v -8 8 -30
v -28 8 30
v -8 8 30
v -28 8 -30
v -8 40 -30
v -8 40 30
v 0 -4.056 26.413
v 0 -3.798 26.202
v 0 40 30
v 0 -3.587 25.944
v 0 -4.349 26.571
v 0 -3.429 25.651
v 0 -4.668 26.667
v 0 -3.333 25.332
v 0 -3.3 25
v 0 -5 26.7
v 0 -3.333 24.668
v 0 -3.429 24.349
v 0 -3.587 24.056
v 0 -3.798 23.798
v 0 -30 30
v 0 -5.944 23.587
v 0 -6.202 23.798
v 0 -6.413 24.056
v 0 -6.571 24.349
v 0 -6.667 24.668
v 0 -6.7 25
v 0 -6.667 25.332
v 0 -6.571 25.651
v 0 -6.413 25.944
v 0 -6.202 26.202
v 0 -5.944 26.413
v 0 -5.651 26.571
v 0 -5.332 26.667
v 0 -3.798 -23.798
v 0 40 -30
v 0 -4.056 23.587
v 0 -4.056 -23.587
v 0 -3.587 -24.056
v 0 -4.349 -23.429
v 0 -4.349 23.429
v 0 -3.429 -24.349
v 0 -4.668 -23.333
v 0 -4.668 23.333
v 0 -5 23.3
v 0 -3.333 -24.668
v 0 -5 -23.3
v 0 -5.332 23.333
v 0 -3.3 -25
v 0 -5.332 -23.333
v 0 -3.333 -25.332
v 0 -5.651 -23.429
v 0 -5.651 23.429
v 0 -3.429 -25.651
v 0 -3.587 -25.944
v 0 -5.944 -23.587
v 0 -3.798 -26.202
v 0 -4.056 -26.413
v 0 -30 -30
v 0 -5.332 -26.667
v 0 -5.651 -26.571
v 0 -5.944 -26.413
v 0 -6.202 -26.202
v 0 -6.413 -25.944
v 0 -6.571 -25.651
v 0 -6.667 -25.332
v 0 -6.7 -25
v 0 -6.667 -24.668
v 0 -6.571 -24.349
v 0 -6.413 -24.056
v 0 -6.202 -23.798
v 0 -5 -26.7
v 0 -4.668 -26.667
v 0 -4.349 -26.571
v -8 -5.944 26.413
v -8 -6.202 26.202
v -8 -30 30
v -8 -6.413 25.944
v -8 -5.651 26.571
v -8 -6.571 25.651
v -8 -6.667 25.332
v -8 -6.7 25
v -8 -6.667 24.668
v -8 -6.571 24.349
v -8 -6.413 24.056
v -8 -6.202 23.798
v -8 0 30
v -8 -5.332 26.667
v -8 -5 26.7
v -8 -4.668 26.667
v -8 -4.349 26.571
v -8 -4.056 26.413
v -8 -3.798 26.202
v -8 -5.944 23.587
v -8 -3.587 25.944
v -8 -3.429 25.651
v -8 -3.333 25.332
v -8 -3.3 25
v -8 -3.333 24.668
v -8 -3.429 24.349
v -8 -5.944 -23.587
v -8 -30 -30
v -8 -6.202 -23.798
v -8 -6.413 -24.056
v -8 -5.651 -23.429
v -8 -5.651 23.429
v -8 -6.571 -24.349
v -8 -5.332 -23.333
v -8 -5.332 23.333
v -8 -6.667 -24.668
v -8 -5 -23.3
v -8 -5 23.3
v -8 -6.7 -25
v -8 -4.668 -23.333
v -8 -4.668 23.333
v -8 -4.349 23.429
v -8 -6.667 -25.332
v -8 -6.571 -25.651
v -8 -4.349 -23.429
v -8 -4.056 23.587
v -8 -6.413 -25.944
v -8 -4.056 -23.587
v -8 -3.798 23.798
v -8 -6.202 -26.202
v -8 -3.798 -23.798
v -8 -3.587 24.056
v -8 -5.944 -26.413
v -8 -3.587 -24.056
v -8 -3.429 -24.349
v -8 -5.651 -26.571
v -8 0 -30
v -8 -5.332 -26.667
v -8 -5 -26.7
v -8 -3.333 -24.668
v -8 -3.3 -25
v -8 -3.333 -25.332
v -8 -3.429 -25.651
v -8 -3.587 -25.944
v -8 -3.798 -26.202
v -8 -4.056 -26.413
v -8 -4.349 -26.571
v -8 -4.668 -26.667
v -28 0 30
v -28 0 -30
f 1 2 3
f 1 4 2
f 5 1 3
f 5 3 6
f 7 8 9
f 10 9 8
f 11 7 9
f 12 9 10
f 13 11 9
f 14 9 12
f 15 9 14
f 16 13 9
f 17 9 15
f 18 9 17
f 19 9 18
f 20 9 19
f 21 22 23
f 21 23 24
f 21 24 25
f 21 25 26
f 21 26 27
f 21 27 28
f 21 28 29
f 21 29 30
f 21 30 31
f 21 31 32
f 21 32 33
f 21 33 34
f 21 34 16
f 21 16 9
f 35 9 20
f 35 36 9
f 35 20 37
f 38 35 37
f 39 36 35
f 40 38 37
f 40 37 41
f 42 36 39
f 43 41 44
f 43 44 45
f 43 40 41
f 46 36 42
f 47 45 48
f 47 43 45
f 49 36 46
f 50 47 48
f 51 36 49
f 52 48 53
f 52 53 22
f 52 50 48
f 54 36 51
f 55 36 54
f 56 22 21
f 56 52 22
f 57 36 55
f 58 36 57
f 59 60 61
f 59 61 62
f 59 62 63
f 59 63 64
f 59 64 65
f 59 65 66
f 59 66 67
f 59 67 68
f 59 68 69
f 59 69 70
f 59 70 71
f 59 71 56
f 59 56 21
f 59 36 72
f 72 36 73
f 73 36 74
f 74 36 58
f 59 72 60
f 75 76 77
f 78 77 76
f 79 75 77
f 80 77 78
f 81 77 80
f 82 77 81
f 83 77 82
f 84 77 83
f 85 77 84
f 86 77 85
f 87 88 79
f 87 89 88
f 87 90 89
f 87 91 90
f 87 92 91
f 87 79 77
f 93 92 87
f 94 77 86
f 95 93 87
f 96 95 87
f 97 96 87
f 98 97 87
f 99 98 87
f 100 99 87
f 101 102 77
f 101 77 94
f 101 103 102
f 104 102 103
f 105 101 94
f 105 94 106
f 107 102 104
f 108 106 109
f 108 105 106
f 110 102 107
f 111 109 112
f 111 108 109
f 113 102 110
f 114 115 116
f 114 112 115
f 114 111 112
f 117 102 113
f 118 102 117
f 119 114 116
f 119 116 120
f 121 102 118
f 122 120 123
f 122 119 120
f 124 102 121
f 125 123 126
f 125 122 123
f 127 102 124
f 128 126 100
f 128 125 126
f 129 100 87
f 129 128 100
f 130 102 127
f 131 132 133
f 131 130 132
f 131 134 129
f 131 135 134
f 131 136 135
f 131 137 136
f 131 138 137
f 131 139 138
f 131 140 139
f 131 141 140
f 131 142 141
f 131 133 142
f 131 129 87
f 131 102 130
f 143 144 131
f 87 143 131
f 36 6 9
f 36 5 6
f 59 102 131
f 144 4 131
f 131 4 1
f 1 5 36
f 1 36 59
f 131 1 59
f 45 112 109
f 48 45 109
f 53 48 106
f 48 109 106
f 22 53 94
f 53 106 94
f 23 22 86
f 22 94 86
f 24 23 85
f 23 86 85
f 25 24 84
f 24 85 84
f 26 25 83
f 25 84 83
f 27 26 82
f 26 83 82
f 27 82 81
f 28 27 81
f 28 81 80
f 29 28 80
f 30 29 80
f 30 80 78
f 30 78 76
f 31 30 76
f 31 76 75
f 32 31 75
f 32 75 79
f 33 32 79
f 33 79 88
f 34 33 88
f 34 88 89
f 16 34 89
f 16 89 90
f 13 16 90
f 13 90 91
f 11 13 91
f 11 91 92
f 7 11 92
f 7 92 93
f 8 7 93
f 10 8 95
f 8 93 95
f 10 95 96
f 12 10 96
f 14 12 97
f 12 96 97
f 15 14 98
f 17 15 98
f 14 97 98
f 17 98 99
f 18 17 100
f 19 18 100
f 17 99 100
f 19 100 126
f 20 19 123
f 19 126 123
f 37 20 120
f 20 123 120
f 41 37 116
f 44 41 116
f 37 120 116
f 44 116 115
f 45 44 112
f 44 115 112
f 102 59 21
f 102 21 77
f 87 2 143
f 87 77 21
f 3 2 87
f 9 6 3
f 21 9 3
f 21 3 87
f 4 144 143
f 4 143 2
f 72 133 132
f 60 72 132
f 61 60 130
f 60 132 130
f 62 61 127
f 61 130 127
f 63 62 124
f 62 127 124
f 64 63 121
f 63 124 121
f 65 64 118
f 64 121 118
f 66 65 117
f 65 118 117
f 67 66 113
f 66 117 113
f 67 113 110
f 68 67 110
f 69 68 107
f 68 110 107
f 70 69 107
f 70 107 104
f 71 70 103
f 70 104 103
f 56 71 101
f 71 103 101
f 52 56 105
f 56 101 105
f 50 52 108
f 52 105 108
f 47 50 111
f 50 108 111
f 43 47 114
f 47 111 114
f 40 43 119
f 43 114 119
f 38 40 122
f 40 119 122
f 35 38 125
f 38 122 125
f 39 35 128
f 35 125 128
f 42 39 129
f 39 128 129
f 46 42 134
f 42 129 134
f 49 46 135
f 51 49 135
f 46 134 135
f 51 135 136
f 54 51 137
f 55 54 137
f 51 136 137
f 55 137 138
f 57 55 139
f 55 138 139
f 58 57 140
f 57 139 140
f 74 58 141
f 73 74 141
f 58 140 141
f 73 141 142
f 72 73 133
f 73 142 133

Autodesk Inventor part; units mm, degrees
ref_plane "YZ Plane" through (0, 0, 0) normal (1, 0, 0) x (0, 1, 0)
ref_plane "XZ Plane" through (0, 0, 0) normal (0, 1, 0) x (-1, 0, 0)
ref_plane "XY Plane" through (0, 0, 0) normal (0, 0, 1) x (1, 0, 0)
sketch "Skizze1" plane through (0, 0, 0) normal (0, 0, 1) x (1, 0, 0)
  line L0 (0, 54) -> (0, -44) projected
  line L1 (-33.6, 0) -> (5.6, 0) projected
  line L2 (-8, 40) -> (0, 40)
  line L3 (0, 40) -> (0, -30)
  line L4 (0, -30) -> (-8, -30)
  line L5 (-8, -30) -> (-8, 0)
  line L6 (-8, 0) -> (-28, 0)
  line L7 (-28, 0) -> (-28, 8)
  line L8 (-28, 8) -> (-8, 8)
  line L9 (-8, 8) -> (-8, 40)
  point P0 (0, 0)
  dimension "d0" = 70
  dimension "d1" = 8
  dimension "d2" = 20
  dimension "d3" = 8
  dimension "d4" = 40
extrude "Extrusion1" add sketch "Skizze1" along normal mid plane 60
sketch "Skizze2" plane through (0, -30, 30) normal (1, 0, 0) x (0, 0, -1)
  point P0 (30, 30)
sketch "Skizze3" plane through (0, -30, 30) normal (1, 0, 0) x (0, 0, -1)
  line L0 (-12, 30) -> (72, 30) projected
  line L1 (30, -14) -> (30, 84) projected
  line L2 (60, 70) -> (0, 70) projected
  point P0 (30, 30)
  point P1 (5, 25)
  point P2 (55, 25)
  dimension "d7" = 50
  dimension "d8" = 45
hole "Bohrung1" at (0, -5, 25) at (0, -5, -25) direction (-1, 0, 0) diameter 3.4 end through all clearance for "Inbusschraube ISO 4762" size "M3" standard "ISO"
properties part number "25_Laser_adapter"
